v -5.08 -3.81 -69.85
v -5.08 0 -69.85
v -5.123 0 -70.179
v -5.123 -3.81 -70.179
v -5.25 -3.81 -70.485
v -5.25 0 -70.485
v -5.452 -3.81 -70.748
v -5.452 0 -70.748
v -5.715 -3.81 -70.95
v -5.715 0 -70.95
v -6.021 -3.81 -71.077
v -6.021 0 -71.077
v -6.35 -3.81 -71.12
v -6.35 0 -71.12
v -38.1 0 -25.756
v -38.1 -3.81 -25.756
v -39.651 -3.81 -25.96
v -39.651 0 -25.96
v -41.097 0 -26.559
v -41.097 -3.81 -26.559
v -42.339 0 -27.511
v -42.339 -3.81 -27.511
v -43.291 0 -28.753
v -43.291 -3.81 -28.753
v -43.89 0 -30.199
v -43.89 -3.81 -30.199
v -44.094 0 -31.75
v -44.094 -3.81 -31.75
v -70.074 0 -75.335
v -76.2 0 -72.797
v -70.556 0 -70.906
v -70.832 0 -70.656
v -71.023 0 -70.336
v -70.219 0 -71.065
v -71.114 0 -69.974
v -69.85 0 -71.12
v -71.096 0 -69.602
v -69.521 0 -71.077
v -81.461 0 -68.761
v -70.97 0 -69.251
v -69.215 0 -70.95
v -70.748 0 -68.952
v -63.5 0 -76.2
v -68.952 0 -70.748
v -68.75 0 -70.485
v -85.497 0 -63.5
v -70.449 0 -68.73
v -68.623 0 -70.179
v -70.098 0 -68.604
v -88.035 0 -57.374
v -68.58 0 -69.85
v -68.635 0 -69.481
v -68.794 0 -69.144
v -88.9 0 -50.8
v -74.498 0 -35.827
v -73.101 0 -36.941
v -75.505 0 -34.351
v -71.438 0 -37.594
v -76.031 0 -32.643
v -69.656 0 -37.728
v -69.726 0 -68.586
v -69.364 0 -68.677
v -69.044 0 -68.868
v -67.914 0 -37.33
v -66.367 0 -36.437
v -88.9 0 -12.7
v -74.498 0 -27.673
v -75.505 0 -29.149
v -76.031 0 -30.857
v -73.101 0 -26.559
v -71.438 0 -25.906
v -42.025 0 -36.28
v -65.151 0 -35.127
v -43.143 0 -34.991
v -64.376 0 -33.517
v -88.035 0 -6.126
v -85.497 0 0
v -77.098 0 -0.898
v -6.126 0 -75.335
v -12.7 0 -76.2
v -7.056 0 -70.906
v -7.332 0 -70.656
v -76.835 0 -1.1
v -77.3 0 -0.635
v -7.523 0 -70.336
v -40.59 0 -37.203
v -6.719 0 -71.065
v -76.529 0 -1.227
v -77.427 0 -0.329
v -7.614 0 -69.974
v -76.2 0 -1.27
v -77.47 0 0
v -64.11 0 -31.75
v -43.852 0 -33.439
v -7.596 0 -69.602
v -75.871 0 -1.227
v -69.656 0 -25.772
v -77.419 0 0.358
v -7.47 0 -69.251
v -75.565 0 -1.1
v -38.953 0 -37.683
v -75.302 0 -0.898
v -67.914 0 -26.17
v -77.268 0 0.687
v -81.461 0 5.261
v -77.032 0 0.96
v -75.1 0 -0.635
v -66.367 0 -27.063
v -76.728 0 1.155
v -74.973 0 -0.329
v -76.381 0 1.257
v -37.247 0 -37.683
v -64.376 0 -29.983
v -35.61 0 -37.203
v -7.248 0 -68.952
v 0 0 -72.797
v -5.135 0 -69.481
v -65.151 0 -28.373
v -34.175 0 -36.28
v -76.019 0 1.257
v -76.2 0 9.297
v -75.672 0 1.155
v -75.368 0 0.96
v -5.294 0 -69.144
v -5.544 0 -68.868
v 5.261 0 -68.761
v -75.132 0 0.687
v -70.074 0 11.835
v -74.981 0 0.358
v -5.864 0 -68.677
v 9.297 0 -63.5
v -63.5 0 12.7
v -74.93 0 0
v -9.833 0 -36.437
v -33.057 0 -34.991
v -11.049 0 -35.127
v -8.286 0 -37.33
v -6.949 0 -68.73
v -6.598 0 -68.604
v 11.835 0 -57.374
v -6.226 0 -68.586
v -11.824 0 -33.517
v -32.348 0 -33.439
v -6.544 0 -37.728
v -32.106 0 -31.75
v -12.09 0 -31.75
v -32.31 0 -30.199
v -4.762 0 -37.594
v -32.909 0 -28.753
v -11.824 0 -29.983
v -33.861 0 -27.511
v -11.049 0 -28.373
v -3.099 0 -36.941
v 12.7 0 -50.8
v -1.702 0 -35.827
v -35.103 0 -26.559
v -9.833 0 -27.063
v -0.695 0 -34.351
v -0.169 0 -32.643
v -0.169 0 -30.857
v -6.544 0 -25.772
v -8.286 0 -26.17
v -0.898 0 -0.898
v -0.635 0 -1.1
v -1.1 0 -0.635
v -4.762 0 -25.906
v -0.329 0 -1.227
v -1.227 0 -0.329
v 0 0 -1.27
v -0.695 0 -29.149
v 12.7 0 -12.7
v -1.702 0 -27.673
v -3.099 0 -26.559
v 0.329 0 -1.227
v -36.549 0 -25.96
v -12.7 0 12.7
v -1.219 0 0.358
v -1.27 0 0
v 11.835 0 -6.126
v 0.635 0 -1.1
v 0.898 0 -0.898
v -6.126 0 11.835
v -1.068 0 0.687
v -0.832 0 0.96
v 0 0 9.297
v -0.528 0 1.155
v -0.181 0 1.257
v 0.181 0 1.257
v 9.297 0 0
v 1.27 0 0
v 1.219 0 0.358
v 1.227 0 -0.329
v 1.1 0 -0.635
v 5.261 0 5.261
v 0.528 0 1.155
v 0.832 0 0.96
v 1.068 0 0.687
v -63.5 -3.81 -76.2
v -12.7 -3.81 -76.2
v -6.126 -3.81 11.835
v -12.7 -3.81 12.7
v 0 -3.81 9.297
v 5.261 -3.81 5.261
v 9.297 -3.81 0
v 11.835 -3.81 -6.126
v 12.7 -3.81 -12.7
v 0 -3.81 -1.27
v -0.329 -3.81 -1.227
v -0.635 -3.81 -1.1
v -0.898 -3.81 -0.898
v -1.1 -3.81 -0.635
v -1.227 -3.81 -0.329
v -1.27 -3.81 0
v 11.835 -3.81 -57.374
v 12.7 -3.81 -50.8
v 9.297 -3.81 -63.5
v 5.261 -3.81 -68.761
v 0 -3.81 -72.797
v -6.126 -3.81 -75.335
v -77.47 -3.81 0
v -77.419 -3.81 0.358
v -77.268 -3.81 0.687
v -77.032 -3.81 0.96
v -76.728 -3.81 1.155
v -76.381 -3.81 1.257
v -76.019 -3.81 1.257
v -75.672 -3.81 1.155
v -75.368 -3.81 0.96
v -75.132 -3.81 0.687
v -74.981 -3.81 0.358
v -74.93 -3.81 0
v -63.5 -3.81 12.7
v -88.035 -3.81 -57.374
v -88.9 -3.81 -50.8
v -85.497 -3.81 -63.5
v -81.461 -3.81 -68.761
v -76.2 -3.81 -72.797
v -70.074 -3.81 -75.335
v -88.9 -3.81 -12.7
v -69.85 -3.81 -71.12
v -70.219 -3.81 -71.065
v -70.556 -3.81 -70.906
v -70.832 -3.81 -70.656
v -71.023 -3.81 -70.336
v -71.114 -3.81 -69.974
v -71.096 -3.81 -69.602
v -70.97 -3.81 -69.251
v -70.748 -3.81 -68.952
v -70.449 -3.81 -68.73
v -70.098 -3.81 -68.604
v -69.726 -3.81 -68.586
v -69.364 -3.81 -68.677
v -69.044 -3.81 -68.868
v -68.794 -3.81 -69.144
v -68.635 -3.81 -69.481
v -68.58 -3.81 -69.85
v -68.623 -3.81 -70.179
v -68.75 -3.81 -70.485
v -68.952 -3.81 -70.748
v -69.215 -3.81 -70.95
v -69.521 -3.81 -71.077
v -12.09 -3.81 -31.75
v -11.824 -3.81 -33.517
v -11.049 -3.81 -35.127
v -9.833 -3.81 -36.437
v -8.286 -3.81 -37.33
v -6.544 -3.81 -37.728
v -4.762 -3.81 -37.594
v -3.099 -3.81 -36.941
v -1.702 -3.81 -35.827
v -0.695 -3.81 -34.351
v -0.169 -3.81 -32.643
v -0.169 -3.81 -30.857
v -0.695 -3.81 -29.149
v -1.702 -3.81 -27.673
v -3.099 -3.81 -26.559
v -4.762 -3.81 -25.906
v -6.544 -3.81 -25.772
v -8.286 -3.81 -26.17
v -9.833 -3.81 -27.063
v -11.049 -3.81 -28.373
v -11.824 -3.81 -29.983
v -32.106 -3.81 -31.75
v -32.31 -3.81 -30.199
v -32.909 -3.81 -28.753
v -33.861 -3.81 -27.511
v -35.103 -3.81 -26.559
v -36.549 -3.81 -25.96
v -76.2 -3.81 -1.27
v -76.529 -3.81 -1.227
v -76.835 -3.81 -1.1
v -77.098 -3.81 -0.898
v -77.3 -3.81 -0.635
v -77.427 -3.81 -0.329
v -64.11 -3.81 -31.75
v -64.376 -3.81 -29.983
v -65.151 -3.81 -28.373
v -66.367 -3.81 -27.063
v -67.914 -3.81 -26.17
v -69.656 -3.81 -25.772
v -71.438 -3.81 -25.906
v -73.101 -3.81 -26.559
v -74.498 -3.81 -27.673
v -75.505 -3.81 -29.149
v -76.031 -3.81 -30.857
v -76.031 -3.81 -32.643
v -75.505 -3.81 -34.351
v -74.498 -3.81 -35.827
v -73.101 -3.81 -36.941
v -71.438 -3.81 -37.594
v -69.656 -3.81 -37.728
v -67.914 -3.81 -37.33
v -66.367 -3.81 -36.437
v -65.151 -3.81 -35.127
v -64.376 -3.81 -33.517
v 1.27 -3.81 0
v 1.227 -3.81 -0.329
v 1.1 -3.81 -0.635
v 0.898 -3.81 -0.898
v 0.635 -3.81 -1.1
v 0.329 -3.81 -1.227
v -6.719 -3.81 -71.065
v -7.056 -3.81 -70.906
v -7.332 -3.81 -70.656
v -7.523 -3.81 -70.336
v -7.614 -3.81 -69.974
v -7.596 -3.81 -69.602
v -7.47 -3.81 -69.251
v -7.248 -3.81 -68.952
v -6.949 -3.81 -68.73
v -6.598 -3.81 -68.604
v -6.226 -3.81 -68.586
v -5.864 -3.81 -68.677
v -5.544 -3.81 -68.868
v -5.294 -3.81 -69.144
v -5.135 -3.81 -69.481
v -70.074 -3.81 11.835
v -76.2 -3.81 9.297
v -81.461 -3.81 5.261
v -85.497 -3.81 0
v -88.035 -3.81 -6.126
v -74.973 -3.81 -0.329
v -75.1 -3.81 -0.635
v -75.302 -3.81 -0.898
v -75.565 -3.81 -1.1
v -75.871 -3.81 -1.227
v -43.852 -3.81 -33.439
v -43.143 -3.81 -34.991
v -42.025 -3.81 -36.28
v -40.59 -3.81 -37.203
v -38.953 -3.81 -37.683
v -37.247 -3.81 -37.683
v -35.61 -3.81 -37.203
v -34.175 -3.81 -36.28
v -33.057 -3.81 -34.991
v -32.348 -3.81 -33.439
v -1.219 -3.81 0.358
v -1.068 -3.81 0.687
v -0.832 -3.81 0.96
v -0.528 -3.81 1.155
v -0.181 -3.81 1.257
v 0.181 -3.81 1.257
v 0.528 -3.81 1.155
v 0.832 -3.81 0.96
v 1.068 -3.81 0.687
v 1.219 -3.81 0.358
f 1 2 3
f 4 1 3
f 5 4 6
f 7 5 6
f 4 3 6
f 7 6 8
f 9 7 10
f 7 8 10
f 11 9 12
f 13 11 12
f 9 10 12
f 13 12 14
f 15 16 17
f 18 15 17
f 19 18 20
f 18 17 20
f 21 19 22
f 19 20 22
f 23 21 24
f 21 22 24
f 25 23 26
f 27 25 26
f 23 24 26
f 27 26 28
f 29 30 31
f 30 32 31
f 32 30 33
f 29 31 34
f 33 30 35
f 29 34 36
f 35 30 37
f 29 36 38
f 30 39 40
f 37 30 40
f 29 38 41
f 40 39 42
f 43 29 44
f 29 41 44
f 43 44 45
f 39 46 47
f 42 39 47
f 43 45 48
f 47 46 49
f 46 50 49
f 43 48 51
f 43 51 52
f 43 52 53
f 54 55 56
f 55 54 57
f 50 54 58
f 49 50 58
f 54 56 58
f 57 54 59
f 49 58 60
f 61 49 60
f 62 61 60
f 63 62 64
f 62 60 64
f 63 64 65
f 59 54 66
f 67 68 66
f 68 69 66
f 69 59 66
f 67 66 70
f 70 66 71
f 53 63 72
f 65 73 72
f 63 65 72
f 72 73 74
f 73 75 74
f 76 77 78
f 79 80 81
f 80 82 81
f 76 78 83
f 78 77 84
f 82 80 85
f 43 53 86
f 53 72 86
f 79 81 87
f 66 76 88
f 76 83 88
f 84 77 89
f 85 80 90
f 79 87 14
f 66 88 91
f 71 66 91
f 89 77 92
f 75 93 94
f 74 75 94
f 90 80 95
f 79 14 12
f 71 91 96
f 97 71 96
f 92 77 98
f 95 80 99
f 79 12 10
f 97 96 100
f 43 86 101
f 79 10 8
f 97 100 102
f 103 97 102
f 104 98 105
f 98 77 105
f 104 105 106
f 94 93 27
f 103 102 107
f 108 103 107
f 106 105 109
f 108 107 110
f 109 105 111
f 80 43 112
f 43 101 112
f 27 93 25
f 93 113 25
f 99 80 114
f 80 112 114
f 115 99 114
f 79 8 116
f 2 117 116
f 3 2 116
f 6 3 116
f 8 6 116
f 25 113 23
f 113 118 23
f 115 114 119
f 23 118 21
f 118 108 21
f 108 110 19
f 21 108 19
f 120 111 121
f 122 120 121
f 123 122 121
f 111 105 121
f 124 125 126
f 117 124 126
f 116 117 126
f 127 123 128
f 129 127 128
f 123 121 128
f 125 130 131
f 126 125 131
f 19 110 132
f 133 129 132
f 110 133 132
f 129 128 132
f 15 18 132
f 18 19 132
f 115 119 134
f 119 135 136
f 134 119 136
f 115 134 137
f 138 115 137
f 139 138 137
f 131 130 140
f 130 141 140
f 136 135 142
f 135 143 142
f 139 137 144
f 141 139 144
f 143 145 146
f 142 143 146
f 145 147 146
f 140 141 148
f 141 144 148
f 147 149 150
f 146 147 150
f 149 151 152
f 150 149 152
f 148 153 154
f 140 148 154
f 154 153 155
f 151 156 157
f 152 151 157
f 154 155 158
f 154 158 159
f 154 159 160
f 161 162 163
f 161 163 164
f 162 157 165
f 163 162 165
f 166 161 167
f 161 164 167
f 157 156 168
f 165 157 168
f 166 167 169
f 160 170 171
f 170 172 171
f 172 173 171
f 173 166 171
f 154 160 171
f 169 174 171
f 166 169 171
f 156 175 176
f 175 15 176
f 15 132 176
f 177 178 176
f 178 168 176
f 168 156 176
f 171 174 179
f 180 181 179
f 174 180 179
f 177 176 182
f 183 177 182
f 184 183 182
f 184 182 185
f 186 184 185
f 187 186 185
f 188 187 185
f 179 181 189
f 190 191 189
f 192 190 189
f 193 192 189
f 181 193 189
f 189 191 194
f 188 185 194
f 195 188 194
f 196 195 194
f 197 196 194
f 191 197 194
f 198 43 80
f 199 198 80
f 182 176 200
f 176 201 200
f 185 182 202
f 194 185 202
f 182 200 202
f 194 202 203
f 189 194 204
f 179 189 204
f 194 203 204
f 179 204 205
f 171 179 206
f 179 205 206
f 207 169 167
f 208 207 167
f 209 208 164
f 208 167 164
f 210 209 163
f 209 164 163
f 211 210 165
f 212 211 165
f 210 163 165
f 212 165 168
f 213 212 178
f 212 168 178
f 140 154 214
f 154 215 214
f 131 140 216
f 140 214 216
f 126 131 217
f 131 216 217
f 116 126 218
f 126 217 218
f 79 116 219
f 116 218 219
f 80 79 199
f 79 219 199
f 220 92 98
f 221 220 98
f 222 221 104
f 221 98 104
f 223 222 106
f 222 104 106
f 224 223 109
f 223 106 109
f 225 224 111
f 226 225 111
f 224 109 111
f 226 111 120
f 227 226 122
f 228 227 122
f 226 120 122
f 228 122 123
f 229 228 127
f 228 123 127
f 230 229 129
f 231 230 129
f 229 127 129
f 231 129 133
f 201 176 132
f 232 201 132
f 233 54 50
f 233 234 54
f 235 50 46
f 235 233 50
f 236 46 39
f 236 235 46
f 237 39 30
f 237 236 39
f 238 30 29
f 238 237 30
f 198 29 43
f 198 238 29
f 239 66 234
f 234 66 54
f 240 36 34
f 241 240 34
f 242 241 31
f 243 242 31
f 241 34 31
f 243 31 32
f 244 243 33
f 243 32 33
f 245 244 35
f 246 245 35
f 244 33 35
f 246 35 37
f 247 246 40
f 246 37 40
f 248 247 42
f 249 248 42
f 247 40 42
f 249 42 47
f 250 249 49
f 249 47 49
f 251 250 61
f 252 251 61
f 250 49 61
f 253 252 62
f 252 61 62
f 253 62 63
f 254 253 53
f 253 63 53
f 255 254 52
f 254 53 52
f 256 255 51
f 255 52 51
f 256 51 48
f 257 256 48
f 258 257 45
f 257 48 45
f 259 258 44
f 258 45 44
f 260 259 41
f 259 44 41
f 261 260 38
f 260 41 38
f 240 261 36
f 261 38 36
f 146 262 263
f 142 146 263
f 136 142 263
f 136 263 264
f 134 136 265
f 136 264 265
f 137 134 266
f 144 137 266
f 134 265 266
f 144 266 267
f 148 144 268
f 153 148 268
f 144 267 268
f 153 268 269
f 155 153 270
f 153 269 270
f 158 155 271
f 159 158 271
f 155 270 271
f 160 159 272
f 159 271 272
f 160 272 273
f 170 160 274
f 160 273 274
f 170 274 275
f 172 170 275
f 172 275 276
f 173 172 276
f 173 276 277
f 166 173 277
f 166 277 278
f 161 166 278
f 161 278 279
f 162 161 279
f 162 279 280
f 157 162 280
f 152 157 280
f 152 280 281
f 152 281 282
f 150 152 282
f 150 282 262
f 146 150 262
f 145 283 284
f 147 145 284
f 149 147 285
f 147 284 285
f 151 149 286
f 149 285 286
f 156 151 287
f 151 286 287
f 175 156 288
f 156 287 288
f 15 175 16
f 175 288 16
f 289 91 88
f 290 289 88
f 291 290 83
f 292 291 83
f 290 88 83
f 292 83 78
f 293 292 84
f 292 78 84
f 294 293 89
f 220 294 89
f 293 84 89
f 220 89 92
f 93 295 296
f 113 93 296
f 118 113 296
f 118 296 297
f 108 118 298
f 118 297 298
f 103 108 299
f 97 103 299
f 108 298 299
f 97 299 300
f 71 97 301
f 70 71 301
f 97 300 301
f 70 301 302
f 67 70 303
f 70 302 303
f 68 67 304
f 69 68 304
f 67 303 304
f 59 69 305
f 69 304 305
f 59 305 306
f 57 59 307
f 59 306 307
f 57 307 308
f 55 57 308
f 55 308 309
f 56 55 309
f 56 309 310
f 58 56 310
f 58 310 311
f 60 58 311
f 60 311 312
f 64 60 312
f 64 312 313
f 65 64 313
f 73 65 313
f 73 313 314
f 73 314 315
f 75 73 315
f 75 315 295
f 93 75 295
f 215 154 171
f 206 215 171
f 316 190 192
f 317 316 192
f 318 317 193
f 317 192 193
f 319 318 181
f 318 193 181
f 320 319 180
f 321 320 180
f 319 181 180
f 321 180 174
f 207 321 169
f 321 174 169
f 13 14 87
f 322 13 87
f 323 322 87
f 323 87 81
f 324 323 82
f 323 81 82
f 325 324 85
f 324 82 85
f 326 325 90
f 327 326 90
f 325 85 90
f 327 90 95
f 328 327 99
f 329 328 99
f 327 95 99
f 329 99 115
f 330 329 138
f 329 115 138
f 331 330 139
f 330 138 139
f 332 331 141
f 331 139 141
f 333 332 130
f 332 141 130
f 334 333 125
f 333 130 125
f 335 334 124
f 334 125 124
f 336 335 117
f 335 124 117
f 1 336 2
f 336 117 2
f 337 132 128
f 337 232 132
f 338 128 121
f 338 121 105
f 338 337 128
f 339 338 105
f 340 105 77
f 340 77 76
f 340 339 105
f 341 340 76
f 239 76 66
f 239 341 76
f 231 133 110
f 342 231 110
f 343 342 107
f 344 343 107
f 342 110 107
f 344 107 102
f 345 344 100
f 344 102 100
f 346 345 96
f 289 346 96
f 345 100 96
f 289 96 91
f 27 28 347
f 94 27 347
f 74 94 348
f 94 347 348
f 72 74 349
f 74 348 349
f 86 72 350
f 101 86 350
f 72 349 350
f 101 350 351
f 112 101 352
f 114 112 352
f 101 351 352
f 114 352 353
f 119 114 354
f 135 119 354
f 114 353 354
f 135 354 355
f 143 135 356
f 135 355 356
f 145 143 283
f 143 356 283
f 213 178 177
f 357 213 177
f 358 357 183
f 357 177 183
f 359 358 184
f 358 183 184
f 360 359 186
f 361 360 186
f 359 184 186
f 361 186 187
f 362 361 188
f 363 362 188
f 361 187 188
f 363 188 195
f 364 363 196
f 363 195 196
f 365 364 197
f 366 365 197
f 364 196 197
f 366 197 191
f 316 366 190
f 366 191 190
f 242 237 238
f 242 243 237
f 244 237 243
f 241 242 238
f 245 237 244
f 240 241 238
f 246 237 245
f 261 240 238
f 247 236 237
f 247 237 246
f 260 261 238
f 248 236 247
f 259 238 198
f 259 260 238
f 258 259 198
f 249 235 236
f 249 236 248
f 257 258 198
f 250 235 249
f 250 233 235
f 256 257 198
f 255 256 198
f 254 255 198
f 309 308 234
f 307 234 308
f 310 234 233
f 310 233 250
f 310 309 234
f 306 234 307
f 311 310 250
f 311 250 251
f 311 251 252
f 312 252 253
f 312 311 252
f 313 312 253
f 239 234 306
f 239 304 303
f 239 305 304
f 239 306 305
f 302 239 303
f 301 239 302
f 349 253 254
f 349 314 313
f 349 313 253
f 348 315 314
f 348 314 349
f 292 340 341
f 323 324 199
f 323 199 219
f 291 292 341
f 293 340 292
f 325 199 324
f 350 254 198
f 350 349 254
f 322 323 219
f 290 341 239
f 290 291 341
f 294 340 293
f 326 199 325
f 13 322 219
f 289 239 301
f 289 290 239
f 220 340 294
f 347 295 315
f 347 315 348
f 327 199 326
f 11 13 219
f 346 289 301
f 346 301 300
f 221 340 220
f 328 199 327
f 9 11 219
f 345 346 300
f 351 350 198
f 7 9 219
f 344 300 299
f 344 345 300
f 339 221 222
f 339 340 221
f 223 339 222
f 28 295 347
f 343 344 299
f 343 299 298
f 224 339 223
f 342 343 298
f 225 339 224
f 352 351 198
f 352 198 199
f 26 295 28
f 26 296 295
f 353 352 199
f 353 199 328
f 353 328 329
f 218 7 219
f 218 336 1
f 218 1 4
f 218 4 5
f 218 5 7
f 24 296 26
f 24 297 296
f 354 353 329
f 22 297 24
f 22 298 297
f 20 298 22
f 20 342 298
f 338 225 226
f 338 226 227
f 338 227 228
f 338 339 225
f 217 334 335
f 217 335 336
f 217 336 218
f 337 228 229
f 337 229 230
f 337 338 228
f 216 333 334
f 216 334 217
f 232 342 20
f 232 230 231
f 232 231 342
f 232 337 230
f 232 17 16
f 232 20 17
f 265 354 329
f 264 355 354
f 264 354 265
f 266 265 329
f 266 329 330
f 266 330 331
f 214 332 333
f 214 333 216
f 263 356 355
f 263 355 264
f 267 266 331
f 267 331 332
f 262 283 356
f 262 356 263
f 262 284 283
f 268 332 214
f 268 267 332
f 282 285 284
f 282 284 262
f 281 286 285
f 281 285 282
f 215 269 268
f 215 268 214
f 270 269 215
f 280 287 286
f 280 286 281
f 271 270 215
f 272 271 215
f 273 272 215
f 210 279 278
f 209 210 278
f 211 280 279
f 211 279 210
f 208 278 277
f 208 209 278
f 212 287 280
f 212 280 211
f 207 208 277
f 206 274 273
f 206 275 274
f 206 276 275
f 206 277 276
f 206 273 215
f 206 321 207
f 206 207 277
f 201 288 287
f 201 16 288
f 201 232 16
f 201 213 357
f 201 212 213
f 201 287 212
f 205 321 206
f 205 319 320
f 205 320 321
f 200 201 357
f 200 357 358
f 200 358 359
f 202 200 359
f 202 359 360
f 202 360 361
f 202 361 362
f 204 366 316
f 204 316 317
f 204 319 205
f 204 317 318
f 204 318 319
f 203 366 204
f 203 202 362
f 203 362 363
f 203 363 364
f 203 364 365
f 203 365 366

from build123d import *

# Parameters (mm, degrees)
F1_DEPTH = 3.81
F2_R     = 5.9944
F3_DEPTH = 25.4
F4_R     = 25.4


with BuildPart() as f1:
    # F0 (on Front) → F1 (new body)
    with BuildSketch(Plane.XZ):
        with BuildLine():
            ThreePointArc((-77.47, 0), (-76.2, 1.27), (-74.93, 0))
            Line((-74.93, 0), (-1.27, 0))
            ThreePointArc((-1.27, 0), (0, 1.27), (1.27, 0))
            Line((1.27, 0), (12.7, 0))
            Line((12.7, 0), (12.7, 12.7))
            Line((12.7, 12.7), (-88.9, 12.7))
            Line((-88.9, 12.7), (-88.9, 0))
            Line((-88.9, 0), (-77.47, 0))
        make_face()
        with BuildLine():
            ThreePointArc((-76.2, -1.27), (-77.0980256121, -0.8980256121), (-77.47, 0))
            Line((-77.47, 0), (-88.9, 0))
            Line((-88.9, 0), (-88.9, -76.2))
            Line((-88.9, -76.2), (-76.2, -76.2))
            Line((-76.2, -76.2), (-76.2, -1.27))
        make_face()
        with BuildLine():
            Line((-1.27, 0), (-74.93, 0))
            ThreePointArc((-74.93, 0), (-75.3019743879, -0.8980256121), (-76.2, -1.27))
            Line((-76.2, -1.27), (-76.2, -76.2))
            Line((-76.2, -76.2), (-69.85, -76.2))
            Line((-69.85, -76.2), (-6.35, -76.2))
            Line((-6.35, -76.2), (-6.35, -71.12))
            ThreePointArc((-6.35, -71.12), (-7.2480256121, -68.9519743879), (-5.08, -69.85))
            Line((-5.08, -69.85), (0, -69.85))
            Line((0, -69.85), (0, -1.27))
            ThreePointArc((0, -1.27), (-0.8980256121, -0.8980256121), (-1.27, 0))
        make_face()
        with BuildLine():
            ThreePointArc((-68.58, -69.85), (-68.9519743879, -70.7480256121), (-69.85, -71.12))
            ThreePointArc((-69.85, -71.12), (-70.7480256121, -68.9519743879), (-68.58, -69.85))
        make_face(mode=Mode.SUBTRACT)
        with BuildLine():
            Line((0, -76.2), (0, -69.85))
            Line((0, -69.85), (-5.08, -69.85))
            ThreePointArc((-5.08, -69.85), (-5.4519743879, -70.7480256121), (-6.35, -71.12))
            Line((-6.35, -71.12), (-6.35, -76.2))
            Line((-6.35, -76.2), (0, -76.2))
        make_face()
        with BuildLine():
            Line((12.7, 0), (1.27, 0))
            ThreePointArc((1.27, 0), (0.8980256121, -0.8980256121), (0, -1.27))
            Line((0, -1.27), (0, -69.85))
            Line((0, -69.85), (0, -76.2))
            Line((0, -76.2), (12.7, -76.2))
            Line((12.7, -76.2), (12.7, 0))
        make_face()
    extrude(amount=F1_DEPTH)

    # F2 (on face) → F3 (cut)
    with BuildSketch(Plane.XZ.offset(3.81)):
        with Locations((-70.104, -31.75)):
            Circle(F2_R)
        with BuildLine():
            Line((-38.1, -31.75), (-38.1, -25.7556))
            ThreePointArc((-38.1, -25.7556), (-42.3386808891, -27.5113191109), (-44.0944, -31.75))
            Line((-44.0944, -31.75), (-38.1, -31.75))
        make_face()
        with BuildLine():
            ThreePointArc((-32.1056, -31.75), (-33.8613191109, -27.5113191109), (-38.1, -25.7556))
            Line((-38.1, -25.7556), (-38.1, -31.75))
            Line((-38.1, -31.75), (-32.1056, -31.75))
        make_face()
        with BuildLine():
            Line((-32.1056, -31.75), (-38.1, -31.75))
            Line((-38.1, -31.75), (-44.0944, -31.75))
            ThreePointArc((-44.0944, -31.75), (-38.1, -37.7444), (-32.1056, -31.75))
        make_face()
        with BuildLine():
            ThreePointArc((-0.1016, -31.75), (-6.096, -25.7556), (-12.0904, -31.75))
            ThreePointArc((-12.0904, -31.75), (-6.096, -37.7444), (-0.1016, -31.75))
        make_face()
    extrude(amount=-F3_DEPTH, mode=Mode.SUBTRACT)

    # F4
    f4_edges = [f1.edges().sort_by_distance(p)[0] for p in [
        (12.7, -1.905, 12.7),
        (-88.9, -1.905, 12.7),
        (12.7, -1.905, -76.2),
        (-88.9, -1.905, -76.2),
    ]]
    fillet(f4_edges, radius=F4_R)


solid = f1.part
